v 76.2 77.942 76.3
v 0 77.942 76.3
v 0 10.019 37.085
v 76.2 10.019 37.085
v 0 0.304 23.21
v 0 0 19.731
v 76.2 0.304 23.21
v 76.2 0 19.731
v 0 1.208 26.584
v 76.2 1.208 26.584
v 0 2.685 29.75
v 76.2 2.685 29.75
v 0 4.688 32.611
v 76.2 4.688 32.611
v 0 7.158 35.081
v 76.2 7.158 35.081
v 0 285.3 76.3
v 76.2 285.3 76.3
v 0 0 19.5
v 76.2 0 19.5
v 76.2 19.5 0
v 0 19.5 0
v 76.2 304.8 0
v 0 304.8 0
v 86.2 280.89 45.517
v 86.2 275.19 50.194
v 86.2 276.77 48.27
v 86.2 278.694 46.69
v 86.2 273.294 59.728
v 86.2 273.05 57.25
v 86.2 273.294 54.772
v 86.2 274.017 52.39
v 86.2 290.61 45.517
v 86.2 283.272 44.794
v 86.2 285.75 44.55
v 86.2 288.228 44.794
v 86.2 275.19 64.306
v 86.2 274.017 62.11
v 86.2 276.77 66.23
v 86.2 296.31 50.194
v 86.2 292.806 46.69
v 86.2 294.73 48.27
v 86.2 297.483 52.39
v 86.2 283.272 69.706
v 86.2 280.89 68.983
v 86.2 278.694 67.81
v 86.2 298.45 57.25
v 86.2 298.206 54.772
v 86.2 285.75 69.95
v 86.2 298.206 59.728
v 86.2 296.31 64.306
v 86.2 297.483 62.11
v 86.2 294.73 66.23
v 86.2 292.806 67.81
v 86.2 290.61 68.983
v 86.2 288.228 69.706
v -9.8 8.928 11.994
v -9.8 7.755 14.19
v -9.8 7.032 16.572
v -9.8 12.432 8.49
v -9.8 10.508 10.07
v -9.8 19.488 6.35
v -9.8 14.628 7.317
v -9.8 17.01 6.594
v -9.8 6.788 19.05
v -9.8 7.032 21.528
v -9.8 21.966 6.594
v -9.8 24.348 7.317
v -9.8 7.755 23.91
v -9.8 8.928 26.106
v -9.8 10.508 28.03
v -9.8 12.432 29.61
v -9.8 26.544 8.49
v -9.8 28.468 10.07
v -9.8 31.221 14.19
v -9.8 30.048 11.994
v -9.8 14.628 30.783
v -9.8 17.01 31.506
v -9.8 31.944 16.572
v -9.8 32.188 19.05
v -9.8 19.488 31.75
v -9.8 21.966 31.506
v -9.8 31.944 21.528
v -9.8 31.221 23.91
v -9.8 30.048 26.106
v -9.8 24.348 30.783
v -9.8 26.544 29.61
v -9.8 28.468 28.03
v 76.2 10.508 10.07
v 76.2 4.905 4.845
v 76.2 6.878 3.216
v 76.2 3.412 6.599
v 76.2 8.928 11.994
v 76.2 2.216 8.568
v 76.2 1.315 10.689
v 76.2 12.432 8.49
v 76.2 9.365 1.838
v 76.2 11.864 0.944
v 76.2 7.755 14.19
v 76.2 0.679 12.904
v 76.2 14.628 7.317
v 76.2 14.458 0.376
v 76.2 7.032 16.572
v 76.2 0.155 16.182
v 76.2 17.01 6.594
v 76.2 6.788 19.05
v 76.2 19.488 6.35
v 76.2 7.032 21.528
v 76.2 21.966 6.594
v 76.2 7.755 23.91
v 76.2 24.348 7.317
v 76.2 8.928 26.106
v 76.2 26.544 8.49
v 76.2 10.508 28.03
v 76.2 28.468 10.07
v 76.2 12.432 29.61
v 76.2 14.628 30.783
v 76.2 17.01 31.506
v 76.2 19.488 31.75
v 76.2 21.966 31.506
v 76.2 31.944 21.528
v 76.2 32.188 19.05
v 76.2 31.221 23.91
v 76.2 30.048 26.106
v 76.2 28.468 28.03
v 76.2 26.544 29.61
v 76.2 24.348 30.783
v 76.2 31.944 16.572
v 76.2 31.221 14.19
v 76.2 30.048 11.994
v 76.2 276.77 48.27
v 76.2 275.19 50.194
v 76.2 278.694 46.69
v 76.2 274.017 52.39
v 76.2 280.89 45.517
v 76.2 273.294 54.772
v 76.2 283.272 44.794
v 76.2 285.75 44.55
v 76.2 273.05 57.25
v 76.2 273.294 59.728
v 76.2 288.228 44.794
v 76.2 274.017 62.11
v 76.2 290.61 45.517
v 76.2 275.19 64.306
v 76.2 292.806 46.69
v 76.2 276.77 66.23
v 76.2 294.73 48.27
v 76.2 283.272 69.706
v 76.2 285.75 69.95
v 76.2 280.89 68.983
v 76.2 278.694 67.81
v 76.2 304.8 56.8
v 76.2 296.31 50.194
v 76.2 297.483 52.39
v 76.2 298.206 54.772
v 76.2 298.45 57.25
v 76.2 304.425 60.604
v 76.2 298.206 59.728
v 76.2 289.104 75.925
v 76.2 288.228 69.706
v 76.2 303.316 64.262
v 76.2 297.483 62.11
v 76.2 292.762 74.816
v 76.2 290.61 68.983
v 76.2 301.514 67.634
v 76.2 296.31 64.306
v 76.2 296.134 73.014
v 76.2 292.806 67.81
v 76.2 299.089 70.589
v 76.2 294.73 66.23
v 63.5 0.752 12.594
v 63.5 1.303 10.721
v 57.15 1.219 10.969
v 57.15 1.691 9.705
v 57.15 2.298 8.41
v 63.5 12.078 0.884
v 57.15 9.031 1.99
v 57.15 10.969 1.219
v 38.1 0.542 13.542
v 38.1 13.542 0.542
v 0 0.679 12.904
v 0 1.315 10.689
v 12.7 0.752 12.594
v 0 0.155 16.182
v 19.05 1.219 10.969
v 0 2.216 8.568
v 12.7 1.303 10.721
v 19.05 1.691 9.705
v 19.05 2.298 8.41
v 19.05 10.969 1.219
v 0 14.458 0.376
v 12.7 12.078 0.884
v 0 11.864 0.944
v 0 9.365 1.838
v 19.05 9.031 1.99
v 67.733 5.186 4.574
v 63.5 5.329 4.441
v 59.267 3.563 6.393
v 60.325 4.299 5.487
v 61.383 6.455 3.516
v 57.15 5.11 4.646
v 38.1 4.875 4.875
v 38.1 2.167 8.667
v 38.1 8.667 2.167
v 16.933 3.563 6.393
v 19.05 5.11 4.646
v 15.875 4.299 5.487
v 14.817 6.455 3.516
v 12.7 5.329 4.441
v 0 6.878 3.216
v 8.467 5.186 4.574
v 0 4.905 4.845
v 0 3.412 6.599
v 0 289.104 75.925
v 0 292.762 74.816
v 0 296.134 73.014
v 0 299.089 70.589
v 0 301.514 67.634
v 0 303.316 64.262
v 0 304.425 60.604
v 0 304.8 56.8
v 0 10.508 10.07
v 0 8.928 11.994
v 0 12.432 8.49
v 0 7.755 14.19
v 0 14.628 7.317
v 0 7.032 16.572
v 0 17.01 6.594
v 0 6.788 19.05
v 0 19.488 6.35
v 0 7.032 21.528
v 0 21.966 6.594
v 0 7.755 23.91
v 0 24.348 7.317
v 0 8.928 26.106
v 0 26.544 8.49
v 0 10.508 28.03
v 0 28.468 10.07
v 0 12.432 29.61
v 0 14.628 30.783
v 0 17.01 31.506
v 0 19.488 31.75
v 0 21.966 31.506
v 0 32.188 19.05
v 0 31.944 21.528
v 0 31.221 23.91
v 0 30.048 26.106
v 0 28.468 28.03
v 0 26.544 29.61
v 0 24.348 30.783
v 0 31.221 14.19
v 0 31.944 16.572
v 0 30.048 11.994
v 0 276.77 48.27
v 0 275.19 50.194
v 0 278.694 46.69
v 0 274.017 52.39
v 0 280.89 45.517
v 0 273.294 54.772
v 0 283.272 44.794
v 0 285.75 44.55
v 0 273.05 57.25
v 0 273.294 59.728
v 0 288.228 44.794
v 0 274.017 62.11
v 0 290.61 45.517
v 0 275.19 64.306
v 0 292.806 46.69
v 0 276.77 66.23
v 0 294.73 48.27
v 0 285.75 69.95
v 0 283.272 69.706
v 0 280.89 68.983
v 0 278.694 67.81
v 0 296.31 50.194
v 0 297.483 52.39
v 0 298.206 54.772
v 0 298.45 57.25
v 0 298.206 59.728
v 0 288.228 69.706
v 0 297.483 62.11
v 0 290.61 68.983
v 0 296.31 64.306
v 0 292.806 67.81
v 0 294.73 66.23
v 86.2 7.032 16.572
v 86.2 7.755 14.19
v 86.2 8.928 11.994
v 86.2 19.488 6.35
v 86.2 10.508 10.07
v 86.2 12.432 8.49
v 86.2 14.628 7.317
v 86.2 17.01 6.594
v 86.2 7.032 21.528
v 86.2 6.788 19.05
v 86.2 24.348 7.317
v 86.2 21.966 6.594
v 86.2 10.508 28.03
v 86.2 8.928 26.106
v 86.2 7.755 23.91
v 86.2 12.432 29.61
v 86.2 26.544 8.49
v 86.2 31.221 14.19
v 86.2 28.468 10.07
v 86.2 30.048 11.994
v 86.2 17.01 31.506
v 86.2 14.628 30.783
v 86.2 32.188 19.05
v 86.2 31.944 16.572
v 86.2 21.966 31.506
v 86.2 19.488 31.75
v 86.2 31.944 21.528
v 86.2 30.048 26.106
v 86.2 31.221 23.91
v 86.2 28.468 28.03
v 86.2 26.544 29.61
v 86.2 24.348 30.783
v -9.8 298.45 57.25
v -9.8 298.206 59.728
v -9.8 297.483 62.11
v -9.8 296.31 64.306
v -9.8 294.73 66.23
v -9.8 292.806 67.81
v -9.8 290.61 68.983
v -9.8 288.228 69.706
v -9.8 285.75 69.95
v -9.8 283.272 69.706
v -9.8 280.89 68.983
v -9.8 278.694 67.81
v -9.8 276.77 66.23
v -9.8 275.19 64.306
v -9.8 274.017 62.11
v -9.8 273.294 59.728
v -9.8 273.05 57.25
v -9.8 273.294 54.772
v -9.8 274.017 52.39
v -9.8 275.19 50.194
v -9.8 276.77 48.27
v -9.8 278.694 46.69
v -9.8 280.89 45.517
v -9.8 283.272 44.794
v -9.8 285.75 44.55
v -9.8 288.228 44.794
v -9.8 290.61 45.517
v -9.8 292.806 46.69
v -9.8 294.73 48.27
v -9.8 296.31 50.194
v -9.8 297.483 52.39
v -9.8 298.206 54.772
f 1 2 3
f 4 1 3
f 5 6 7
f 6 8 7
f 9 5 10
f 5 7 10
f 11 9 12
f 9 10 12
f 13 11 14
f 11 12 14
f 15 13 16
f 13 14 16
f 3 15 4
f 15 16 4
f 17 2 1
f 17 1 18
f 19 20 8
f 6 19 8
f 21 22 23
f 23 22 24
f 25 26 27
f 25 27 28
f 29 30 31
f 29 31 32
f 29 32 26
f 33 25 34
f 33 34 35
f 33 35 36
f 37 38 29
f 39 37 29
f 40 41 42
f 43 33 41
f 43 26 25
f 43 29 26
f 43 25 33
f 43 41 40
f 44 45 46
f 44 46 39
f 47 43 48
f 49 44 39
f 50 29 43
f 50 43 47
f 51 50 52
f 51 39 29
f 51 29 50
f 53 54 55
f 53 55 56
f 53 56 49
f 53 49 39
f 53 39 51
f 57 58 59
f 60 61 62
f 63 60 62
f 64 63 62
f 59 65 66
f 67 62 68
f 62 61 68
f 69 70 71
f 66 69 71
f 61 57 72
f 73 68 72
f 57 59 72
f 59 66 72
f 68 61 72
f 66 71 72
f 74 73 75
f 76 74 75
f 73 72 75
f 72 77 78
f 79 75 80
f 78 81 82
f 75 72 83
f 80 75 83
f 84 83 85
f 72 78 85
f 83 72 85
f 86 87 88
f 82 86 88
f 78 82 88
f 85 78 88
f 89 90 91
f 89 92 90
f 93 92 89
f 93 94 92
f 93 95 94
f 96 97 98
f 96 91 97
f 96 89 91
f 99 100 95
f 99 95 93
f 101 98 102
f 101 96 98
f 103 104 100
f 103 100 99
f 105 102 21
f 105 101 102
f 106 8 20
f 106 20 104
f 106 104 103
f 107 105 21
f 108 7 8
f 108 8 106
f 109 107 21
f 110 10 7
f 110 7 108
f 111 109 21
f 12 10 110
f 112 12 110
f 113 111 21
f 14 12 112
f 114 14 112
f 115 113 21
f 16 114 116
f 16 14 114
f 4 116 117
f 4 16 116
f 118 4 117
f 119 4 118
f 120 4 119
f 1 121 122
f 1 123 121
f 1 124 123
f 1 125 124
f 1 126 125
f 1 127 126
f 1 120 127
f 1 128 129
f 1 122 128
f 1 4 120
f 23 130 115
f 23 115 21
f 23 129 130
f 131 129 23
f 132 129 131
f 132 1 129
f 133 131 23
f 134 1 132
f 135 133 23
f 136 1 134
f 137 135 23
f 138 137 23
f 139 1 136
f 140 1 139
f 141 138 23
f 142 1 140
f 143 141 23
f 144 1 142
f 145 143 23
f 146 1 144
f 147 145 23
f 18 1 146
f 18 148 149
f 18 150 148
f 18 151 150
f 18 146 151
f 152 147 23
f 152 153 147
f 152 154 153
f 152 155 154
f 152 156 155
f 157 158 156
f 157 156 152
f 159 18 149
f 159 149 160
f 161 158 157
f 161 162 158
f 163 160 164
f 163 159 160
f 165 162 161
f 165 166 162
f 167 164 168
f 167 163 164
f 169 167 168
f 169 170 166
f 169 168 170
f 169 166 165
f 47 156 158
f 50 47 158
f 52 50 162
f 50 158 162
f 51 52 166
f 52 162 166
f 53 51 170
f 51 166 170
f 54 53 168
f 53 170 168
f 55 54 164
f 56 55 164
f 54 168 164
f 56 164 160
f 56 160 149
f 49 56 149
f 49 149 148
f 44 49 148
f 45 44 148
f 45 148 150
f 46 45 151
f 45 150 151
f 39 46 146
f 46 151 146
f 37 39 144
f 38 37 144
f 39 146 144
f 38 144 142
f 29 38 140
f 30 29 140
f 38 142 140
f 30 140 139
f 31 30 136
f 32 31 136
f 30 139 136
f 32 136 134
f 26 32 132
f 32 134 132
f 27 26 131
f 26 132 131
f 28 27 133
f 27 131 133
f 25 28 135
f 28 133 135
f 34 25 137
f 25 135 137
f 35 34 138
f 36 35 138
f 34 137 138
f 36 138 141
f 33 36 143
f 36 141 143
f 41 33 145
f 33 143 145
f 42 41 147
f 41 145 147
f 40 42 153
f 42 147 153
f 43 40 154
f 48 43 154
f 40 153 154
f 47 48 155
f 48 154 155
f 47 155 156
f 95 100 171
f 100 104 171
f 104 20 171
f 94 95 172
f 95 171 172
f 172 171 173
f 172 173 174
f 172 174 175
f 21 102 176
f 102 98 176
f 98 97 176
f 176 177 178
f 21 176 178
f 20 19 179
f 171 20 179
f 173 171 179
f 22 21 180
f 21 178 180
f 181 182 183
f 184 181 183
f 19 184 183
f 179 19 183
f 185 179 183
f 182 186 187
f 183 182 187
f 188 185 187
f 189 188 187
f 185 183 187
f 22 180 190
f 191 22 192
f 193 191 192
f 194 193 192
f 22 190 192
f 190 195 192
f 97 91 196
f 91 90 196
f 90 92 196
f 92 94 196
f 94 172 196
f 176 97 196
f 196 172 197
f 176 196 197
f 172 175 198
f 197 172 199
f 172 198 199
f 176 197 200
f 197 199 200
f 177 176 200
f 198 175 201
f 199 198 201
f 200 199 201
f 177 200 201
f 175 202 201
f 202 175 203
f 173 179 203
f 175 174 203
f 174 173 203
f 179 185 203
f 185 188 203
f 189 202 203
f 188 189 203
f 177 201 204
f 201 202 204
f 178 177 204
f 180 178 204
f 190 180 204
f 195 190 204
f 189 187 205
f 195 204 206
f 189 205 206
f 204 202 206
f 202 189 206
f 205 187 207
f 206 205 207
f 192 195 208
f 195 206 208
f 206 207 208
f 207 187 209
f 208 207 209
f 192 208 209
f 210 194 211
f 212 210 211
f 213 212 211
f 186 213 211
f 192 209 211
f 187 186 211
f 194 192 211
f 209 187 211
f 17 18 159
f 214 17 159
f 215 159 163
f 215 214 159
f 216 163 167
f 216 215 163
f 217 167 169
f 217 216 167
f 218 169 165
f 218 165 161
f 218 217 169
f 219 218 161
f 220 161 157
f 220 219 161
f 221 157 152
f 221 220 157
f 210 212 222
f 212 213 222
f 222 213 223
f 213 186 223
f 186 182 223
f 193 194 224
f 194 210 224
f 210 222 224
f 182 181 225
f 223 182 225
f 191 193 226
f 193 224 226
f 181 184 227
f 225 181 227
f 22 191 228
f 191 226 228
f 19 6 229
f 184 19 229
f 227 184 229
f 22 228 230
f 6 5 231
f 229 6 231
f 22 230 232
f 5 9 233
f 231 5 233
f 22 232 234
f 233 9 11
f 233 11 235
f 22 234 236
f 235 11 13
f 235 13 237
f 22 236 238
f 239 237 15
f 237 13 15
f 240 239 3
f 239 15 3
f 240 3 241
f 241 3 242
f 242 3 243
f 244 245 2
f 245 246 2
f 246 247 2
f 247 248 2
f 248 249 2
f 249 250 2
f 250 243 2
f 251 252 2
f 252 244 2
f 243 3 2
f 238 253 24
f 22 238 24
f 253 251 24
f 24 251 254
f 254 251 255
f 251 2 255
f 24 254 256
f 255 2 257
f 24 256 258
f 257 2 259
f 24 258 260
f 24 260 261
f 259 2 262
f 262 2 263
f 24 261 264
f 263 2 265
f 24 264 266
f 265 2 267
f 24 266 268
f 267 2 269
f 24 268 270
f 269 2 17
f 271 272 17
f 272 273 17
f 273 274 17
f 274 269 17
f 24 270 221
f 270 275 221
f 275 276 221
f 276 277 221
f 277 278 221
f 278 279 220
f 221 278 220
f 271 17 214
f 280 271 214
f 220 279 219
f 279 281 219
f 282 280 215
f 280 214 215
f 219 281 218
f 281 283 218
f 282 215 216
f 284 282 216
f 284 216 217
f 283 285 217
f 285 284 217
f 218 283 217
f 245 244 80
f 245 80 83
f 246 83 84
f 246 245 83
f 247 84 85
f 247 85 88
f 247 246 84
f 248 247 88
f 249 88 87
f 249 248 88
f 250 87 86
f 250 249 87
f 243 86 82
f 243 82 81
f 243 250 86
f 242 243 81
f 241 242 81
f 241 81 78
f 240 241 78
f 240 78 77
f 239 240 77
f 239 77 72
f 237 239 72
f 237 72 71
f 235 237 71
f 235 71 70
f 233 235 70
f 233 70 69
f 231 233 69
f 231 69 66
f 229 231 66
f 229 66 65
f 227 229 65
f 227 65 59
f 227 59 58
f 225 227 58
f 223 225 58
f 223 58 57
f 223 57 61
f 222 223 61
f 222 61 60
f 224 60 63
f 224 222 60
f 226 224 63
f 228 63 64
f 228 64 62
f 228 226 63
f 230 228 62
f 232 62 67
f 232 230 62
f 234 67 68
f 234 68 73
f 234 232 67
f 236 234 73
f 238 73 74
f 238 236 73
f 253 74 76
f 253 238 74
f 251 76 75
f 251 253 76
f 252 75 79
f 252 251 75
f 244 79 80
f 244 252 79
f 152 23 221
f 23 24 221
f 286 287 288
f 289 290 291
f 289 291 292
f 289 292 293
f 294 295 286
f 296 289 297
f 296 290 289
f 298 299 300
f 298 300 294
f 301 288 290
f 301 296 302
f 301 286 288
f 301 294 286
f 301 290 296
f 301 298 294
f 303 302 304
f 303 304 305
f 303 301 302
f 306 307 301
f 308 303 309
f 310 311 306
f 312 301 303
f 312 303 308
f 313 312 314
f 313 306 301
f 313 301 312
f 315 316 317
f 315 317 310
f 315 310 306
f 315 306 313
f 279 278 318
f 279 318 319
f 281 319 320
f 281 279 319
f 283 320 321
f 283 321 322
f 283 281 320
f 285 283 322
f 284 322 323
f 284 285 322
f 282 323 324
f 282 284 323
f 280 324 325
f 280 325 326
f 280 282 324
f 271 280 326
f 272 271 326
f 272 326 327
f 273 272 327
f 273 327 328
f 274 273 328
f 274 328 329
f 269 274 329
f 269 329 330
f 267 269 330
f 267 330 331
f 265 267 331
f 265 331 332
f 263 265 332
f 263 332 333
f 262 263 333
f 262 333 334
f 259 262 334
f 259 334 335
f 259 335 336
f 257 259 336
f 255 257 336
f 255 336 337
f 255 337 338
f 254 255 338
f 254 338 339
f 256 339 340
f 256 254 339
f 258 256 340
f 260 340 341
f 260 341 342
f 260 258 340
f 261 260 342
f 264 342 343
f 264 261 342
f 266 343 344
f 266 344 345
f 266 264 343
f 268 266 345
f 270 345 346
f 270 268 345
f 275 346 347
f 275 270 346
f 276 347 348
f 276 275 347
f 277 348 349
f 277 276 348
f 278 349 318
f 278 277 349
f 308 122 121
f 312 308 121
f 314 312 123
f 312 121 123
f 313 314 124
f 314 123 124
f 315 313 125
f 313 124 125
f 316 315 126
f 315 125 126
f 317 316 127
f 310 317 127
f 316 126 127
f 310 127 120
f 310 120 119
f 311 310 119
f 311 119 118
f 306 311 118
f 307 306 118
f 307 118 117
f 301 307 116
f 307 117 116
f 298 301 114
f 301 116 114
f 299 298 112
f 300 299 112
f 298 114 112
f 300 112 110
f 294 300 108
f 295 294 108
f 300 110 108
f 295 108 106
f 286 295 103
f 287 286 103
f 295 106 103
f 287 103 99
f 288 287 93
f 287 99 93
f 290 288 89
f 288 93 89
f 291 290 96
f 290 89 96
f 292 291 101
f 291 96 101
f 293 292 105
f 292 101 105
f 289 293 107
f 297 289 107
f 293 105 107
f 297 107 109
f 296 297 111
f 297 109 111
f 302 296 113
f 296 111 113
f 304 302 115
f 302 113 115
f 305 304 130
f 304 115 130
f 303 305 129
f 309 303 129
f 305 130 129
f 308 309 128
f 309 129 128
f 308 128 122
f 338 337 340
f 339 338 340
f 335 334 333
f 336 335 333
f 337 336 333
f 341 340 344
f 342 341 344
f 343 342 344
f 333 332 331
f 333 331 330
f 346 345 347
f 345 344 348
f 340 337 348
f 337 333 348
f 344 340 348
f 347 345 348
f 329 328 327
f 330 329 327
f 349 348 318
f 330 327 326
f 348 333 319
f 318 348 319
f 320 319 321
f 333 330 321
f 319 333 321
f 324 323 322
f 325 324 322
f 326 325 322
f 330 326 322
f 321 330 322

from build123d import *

# Parameters (mm, degrees)
F0_W           = 304.8
F0_H           = 76.3
F1_DEPTH       = 3
F2_DEPTH       = 76.2
F3_T1_DEPTH    = 173.7
F4_R           = 19.5
F5_T1_DEPTH    = 479.4867573526
F6_R           = 20.0387150069
F8_R           = 12.7
F9_DEPTH       = 10
F9_DEPTH_BACK  = 86
F10_R          = 12.7
F11_DEPTH      = 10
F11_DEPTH_BACK = 86


# Not quite as in the source:
# - a fillet or chamfer that OpenCascade refuses, or shapes differently, is made with other operations: its cross-section is extruded or revolved along the edge and cut away or added


with BuildPart() as f1:
    # F0 (on Right) → F1 (new body)
    with BuildSketch(Plane.YZ):
        with Locations((152.4, 38.15)):
            Rectangle(F0_W, F0_H)
    extrude(amount=F1_DEPTH)

    # F0 (on Right) → F2 (join)
    with BuildSketch(Plane.YZ):
        with Locations((152.4, 38.15)):
            Rectangle(F0_W, F0_H)
    extrude(amount=F2_DEPTH)

    # F3: fillet of radius 19.5 on 1 edges, made by hand

    # F3_s2 → F3_t1 (cut)
    with BuildSketch(Plane.YZ.offset(-48.75)):
        with BuildLine():
            add(Edge.make_bspline(
                [(0, 19.5), (0, 0), (19.5, 0)],
                knots=[0, 0, 0, 1, 1, 1], degree=2, weights=[1, 1, 1]))
            Line((19.5, 0), (0, 0))
            Line((0, 0), (0, 19.5))
        make_face()
    extrude(amount=F3_T1_DEPTH, mode=Mode.SUBTRACT)

    # F4
    f4_edges = [f1.edges().sort_by_distance(p)[0] for p in [
        (38.1, 304.8, 76.3),
    ]]
    fillet(f4_edges, radius=F4_R)

    # F5: chamfer of 45 x 77.9422863406 on 1 edges, made by hand

    # F5_s2 → F5_t1 (cut)
    with BuildSketch(Plane.YZ.offset(-201.6433786763)):
        Polygon((77.9422863406, 76.3), (0, 31.3), (0, 76.3), align=None)
    extrude(amount=F5_T1_DEPTH, mode=Mode.SUBTRACT)

    # F6
    f6_edges = [f1.edges().sort_by_distance(p)[0] for p in [
        (38.1, 0, 31.3),
    ]]
    fillet(f6_edges, radius=F6_R)

    # F8 (on offset) → F9 (join, two sides)
    with BuildSketch(Plane.YZ.offset(76.2)) as f9_sk:
        with Locations((19.4881175538, 19.05)):
            Circle(F8_R)
    extrude(amount=F9_DEPTH)
    extrude(f9_sk.sketch, amount=-F9_DEPTH_BACK)

    # F10 (on offset) → F11 (join, two sides)
    with BuildSketch(Plane.YZ.offset(76.2)) as f11_sk:
        with Locations((285.75, 57.25)):
            Circle(F10_R)
    extrude(amount=F11_DEPTH)
    extrude(f11_sk.sketch, amount=-F11_DEPTH_BACK)


solid = f1.part
